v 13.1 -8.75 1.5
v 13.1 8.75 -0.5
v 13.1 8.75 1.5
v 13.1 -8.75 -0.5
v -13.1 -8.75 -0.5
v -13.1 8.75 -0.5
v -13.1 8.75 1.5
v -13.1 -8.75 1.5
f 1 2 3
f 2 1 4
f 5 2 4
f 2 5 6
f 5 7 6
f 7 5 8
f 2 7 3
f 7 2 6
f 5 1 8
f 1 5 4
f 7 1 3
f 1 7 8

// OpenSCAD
// Parameters
length = 26.2; //[13.1:52.4:0.1]
width = 17.5; //[8.75:35:0.1]
thickness = 1; //[0.5:2:0.1]

// Battery - complete geometry
module battery() {
  color([0.85, 0.85, 0.8]) { // Off-white for 3D printed PLA
    // Main body
    cube([length, width, thickness], center=true);
  }
}

// Mod - complete geometry
module mod() {
  color([0.1, 0.1, 0.6]) { // Blue for PCB-like appearance
    // Main body
    cube([length, width, thickness], center=true);
  }
}

// Assembly
module assembly() {
  // Place battery at origin
  battery();
  // Place mod on top of battery
  translate([0, 0, thickness]) mod();
}

assembly();
